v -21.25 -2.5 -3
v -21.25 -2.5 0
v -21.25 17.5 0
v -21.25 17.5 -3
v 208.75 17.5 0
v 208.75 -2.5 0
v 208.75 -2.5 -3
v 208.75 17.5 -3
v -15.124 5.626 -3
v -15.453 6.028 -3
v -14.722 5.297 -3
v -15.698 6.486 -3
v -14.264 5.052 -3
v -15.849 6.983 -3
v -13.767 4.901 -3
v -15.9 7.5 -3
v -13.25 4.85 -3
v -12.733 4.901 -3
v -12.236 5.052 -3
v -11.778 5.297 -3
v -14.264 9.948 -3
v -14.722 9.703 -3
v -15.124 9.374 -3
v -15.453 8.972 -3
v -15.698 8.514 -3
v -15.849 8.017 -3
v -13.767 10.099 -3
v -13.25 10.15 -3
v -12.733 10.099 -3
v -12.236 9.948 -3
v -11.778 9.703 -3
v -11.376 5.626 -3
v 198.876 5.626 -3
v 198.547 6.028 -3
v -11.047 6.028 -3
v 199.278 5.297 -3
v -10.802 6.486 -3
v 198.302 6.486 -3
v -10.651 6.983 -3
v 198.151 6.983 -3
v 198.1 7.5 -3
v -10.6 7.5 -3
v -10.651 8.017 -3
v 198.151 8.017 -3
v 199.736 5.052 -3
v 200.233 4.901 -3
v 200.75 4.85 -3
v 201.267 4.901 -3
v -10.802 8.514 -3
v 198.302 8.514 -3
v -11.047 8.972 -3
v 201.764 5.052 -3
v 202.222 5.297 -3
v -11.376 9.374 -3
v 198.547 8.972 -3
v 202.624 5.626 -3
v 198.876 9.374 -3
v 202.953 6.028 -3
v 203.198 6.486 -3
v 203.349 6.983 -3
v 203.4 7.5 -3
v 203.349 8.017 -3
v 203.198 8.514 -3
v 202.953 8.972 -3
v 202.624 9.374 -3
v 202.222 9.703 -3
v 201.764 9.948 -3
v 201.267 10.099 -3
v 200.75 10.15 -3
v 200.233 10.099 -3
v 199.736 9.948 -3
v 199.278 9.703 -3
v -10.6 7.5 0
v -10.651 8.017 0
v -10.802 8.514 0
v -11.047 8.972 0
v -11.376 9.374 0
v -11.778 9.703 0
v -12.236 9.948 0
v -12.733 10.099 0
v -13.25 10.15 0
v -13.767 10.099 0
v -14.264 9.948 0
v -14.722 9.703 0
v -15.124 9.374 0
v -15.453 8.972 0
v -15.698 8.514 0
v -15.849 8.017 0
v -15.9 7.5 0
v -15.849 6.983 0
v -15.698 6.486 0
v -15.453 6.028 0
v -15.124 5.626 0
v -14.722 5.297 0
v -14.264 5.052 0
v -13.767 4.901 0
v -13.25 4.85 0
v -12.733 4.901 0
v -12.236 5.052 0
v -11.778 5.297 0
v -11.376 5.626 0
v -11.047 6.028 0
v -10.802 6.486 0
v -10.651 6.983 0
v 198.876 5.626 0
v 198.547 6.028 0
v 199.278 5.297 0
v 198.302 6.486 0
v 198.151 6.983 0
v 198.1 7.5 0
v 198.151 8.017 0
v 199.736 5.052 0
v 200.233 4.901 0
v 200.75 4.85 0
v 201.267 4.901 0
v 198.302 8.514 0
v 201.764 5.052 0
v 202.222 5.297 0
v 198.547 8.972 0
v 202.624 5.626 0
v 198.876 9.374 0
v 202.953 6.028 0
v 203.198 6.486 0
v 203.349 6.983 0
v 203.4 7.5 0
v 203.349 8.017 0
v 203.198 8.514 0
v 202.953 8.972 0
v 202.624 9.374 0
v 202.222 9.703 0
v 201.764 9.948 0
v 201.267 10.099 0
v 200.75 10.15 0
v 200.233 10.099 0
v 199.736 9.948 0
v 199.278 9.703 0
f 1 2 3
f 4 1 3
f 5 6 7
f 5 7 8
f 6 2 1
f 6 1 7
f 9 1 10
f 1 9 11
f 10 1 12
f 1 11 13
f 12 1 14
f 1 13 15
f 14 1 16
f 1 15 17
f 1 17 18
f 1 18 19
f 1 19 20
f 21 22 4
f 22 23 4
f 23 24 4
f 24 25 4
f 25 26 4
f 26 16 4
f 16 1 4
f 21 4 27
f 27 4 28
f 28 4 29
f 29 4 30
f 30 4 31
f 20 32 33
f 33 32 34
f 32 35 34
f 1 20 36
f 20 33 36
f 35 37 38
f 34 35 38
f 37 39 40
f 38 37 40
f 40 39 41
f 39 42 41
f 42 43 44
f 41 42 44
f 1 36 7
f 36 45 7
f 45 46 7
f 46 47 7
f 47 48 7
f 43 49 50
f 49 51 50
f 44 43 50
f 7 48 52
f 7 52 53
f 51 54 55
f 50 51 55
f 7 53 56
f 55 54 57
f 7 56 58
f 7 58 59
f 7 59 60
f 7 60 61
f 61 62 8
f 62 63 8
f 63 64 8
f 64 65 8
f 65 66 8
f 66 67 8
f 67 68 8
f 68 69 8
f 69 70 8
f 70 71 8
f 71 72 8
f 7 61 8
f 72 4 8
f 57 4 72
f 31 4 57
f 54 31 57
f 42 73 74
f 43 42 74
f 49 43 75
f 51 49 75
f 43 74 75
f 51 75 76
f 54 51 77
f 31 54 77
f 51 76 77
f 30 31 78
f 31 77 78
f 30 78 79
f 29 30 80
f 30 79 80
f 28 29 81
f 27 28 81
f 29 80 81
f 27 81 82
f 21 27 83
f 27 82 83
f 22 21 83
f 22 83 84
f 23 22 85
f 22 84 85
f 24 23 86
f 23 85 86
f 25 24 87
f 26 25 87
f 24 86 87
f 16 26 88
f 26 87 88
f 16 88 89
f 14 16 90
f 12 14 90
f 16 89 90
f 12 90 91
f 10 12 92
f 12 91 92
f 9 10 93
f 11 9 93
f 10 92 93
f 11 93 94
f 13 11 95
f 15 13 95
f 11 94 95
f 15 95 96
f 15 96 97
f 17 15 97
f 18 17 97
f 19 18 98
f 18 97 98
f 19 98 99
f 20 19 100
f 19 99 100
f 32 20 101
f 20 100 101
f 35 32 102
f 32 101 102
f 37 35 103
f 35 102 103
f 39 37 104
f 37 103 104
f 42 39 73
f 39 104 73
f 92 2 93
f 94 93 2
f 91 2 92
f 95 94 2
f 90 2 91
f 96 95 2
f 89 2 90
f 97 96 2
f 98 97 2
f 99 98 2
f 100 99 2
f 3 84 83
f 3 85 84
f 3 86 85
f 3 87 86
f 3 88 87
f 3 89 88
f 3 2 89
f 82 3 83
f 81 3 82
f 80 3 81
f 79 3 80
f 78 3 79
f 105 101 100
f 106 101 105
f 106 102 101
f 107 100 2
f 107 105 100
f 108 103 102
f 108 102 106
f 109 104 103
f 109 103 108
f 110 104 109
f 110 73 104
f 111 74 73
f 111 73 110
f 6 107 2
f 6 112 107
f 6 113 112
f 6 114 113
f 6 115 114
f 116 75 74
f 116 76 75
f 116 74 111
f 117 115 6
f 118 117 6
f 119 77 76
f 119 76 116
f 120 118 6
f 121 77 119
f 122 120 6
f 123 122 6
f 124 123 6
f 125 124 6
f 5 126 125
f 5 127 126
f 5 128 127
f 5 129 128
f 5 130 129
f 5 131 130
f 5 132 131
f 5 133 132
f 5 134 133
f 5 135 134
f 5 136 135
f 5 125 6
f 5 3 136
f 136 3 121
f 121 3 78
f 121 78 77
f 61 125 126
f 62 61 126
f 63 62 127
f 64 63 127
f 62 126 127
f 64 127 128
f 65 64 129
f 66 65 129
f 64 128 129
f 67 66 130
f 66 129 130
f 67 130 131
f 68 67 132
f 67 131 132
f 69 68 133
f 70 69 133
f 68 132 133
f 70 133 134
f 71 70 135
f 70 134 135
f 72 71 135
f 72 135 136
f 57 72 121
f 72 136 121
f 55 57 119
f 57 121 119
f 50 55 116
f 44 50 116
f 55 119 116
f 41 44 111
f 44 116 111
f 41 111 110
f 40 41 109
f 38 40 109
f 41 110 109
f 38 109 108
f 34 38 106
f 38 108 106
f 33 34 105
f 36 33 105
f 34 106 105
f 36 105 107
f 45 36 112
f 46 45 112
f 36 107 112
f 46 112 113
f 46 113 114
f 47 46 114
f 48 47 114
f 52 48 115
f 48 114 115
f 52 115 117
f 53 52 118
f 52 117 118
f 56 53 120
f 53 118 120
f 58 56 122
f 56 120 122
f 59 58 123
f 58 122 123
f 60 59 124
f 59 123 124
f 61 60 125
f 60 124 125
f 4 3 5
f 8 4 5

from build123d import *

# Parameters (mm, degrees)
EXTRUSION_BASE_SKETCH_W      = 230
EXTRUSION_BASE_SKETCH_H      = 20
EXTRUSION_BASE_SKETCH_R      = 2.65
EXTRUSION_BASE_EXTRUDE_DEPTH = 3


with BuildPart() as part:
    # Extrusion Base Sketch → Extrusion Base Extrude (new body)
    with BuildSketch(Plane.XY):
        with Locations((93.75, 7.5)):
            Rectangle(EXTRUSION_BASE_SKETCH_W, EXTRUSION_BASE_SKETCH_H)
        with Locations((-13.25, 7.5)):
            Circle(EXTRUSION_BASE_SKETCH_R, mode=Mode.SUBTRACT)
        with Locations((200.75, 7.5)):
            Circle(EXTRUSION_BASE_SKETCH_R, mode=Mode.SUBTRACT)
    extrude(amount=-EXTRUSION_BASE_EXTRUDE_DEPTH)


solid = part.part
